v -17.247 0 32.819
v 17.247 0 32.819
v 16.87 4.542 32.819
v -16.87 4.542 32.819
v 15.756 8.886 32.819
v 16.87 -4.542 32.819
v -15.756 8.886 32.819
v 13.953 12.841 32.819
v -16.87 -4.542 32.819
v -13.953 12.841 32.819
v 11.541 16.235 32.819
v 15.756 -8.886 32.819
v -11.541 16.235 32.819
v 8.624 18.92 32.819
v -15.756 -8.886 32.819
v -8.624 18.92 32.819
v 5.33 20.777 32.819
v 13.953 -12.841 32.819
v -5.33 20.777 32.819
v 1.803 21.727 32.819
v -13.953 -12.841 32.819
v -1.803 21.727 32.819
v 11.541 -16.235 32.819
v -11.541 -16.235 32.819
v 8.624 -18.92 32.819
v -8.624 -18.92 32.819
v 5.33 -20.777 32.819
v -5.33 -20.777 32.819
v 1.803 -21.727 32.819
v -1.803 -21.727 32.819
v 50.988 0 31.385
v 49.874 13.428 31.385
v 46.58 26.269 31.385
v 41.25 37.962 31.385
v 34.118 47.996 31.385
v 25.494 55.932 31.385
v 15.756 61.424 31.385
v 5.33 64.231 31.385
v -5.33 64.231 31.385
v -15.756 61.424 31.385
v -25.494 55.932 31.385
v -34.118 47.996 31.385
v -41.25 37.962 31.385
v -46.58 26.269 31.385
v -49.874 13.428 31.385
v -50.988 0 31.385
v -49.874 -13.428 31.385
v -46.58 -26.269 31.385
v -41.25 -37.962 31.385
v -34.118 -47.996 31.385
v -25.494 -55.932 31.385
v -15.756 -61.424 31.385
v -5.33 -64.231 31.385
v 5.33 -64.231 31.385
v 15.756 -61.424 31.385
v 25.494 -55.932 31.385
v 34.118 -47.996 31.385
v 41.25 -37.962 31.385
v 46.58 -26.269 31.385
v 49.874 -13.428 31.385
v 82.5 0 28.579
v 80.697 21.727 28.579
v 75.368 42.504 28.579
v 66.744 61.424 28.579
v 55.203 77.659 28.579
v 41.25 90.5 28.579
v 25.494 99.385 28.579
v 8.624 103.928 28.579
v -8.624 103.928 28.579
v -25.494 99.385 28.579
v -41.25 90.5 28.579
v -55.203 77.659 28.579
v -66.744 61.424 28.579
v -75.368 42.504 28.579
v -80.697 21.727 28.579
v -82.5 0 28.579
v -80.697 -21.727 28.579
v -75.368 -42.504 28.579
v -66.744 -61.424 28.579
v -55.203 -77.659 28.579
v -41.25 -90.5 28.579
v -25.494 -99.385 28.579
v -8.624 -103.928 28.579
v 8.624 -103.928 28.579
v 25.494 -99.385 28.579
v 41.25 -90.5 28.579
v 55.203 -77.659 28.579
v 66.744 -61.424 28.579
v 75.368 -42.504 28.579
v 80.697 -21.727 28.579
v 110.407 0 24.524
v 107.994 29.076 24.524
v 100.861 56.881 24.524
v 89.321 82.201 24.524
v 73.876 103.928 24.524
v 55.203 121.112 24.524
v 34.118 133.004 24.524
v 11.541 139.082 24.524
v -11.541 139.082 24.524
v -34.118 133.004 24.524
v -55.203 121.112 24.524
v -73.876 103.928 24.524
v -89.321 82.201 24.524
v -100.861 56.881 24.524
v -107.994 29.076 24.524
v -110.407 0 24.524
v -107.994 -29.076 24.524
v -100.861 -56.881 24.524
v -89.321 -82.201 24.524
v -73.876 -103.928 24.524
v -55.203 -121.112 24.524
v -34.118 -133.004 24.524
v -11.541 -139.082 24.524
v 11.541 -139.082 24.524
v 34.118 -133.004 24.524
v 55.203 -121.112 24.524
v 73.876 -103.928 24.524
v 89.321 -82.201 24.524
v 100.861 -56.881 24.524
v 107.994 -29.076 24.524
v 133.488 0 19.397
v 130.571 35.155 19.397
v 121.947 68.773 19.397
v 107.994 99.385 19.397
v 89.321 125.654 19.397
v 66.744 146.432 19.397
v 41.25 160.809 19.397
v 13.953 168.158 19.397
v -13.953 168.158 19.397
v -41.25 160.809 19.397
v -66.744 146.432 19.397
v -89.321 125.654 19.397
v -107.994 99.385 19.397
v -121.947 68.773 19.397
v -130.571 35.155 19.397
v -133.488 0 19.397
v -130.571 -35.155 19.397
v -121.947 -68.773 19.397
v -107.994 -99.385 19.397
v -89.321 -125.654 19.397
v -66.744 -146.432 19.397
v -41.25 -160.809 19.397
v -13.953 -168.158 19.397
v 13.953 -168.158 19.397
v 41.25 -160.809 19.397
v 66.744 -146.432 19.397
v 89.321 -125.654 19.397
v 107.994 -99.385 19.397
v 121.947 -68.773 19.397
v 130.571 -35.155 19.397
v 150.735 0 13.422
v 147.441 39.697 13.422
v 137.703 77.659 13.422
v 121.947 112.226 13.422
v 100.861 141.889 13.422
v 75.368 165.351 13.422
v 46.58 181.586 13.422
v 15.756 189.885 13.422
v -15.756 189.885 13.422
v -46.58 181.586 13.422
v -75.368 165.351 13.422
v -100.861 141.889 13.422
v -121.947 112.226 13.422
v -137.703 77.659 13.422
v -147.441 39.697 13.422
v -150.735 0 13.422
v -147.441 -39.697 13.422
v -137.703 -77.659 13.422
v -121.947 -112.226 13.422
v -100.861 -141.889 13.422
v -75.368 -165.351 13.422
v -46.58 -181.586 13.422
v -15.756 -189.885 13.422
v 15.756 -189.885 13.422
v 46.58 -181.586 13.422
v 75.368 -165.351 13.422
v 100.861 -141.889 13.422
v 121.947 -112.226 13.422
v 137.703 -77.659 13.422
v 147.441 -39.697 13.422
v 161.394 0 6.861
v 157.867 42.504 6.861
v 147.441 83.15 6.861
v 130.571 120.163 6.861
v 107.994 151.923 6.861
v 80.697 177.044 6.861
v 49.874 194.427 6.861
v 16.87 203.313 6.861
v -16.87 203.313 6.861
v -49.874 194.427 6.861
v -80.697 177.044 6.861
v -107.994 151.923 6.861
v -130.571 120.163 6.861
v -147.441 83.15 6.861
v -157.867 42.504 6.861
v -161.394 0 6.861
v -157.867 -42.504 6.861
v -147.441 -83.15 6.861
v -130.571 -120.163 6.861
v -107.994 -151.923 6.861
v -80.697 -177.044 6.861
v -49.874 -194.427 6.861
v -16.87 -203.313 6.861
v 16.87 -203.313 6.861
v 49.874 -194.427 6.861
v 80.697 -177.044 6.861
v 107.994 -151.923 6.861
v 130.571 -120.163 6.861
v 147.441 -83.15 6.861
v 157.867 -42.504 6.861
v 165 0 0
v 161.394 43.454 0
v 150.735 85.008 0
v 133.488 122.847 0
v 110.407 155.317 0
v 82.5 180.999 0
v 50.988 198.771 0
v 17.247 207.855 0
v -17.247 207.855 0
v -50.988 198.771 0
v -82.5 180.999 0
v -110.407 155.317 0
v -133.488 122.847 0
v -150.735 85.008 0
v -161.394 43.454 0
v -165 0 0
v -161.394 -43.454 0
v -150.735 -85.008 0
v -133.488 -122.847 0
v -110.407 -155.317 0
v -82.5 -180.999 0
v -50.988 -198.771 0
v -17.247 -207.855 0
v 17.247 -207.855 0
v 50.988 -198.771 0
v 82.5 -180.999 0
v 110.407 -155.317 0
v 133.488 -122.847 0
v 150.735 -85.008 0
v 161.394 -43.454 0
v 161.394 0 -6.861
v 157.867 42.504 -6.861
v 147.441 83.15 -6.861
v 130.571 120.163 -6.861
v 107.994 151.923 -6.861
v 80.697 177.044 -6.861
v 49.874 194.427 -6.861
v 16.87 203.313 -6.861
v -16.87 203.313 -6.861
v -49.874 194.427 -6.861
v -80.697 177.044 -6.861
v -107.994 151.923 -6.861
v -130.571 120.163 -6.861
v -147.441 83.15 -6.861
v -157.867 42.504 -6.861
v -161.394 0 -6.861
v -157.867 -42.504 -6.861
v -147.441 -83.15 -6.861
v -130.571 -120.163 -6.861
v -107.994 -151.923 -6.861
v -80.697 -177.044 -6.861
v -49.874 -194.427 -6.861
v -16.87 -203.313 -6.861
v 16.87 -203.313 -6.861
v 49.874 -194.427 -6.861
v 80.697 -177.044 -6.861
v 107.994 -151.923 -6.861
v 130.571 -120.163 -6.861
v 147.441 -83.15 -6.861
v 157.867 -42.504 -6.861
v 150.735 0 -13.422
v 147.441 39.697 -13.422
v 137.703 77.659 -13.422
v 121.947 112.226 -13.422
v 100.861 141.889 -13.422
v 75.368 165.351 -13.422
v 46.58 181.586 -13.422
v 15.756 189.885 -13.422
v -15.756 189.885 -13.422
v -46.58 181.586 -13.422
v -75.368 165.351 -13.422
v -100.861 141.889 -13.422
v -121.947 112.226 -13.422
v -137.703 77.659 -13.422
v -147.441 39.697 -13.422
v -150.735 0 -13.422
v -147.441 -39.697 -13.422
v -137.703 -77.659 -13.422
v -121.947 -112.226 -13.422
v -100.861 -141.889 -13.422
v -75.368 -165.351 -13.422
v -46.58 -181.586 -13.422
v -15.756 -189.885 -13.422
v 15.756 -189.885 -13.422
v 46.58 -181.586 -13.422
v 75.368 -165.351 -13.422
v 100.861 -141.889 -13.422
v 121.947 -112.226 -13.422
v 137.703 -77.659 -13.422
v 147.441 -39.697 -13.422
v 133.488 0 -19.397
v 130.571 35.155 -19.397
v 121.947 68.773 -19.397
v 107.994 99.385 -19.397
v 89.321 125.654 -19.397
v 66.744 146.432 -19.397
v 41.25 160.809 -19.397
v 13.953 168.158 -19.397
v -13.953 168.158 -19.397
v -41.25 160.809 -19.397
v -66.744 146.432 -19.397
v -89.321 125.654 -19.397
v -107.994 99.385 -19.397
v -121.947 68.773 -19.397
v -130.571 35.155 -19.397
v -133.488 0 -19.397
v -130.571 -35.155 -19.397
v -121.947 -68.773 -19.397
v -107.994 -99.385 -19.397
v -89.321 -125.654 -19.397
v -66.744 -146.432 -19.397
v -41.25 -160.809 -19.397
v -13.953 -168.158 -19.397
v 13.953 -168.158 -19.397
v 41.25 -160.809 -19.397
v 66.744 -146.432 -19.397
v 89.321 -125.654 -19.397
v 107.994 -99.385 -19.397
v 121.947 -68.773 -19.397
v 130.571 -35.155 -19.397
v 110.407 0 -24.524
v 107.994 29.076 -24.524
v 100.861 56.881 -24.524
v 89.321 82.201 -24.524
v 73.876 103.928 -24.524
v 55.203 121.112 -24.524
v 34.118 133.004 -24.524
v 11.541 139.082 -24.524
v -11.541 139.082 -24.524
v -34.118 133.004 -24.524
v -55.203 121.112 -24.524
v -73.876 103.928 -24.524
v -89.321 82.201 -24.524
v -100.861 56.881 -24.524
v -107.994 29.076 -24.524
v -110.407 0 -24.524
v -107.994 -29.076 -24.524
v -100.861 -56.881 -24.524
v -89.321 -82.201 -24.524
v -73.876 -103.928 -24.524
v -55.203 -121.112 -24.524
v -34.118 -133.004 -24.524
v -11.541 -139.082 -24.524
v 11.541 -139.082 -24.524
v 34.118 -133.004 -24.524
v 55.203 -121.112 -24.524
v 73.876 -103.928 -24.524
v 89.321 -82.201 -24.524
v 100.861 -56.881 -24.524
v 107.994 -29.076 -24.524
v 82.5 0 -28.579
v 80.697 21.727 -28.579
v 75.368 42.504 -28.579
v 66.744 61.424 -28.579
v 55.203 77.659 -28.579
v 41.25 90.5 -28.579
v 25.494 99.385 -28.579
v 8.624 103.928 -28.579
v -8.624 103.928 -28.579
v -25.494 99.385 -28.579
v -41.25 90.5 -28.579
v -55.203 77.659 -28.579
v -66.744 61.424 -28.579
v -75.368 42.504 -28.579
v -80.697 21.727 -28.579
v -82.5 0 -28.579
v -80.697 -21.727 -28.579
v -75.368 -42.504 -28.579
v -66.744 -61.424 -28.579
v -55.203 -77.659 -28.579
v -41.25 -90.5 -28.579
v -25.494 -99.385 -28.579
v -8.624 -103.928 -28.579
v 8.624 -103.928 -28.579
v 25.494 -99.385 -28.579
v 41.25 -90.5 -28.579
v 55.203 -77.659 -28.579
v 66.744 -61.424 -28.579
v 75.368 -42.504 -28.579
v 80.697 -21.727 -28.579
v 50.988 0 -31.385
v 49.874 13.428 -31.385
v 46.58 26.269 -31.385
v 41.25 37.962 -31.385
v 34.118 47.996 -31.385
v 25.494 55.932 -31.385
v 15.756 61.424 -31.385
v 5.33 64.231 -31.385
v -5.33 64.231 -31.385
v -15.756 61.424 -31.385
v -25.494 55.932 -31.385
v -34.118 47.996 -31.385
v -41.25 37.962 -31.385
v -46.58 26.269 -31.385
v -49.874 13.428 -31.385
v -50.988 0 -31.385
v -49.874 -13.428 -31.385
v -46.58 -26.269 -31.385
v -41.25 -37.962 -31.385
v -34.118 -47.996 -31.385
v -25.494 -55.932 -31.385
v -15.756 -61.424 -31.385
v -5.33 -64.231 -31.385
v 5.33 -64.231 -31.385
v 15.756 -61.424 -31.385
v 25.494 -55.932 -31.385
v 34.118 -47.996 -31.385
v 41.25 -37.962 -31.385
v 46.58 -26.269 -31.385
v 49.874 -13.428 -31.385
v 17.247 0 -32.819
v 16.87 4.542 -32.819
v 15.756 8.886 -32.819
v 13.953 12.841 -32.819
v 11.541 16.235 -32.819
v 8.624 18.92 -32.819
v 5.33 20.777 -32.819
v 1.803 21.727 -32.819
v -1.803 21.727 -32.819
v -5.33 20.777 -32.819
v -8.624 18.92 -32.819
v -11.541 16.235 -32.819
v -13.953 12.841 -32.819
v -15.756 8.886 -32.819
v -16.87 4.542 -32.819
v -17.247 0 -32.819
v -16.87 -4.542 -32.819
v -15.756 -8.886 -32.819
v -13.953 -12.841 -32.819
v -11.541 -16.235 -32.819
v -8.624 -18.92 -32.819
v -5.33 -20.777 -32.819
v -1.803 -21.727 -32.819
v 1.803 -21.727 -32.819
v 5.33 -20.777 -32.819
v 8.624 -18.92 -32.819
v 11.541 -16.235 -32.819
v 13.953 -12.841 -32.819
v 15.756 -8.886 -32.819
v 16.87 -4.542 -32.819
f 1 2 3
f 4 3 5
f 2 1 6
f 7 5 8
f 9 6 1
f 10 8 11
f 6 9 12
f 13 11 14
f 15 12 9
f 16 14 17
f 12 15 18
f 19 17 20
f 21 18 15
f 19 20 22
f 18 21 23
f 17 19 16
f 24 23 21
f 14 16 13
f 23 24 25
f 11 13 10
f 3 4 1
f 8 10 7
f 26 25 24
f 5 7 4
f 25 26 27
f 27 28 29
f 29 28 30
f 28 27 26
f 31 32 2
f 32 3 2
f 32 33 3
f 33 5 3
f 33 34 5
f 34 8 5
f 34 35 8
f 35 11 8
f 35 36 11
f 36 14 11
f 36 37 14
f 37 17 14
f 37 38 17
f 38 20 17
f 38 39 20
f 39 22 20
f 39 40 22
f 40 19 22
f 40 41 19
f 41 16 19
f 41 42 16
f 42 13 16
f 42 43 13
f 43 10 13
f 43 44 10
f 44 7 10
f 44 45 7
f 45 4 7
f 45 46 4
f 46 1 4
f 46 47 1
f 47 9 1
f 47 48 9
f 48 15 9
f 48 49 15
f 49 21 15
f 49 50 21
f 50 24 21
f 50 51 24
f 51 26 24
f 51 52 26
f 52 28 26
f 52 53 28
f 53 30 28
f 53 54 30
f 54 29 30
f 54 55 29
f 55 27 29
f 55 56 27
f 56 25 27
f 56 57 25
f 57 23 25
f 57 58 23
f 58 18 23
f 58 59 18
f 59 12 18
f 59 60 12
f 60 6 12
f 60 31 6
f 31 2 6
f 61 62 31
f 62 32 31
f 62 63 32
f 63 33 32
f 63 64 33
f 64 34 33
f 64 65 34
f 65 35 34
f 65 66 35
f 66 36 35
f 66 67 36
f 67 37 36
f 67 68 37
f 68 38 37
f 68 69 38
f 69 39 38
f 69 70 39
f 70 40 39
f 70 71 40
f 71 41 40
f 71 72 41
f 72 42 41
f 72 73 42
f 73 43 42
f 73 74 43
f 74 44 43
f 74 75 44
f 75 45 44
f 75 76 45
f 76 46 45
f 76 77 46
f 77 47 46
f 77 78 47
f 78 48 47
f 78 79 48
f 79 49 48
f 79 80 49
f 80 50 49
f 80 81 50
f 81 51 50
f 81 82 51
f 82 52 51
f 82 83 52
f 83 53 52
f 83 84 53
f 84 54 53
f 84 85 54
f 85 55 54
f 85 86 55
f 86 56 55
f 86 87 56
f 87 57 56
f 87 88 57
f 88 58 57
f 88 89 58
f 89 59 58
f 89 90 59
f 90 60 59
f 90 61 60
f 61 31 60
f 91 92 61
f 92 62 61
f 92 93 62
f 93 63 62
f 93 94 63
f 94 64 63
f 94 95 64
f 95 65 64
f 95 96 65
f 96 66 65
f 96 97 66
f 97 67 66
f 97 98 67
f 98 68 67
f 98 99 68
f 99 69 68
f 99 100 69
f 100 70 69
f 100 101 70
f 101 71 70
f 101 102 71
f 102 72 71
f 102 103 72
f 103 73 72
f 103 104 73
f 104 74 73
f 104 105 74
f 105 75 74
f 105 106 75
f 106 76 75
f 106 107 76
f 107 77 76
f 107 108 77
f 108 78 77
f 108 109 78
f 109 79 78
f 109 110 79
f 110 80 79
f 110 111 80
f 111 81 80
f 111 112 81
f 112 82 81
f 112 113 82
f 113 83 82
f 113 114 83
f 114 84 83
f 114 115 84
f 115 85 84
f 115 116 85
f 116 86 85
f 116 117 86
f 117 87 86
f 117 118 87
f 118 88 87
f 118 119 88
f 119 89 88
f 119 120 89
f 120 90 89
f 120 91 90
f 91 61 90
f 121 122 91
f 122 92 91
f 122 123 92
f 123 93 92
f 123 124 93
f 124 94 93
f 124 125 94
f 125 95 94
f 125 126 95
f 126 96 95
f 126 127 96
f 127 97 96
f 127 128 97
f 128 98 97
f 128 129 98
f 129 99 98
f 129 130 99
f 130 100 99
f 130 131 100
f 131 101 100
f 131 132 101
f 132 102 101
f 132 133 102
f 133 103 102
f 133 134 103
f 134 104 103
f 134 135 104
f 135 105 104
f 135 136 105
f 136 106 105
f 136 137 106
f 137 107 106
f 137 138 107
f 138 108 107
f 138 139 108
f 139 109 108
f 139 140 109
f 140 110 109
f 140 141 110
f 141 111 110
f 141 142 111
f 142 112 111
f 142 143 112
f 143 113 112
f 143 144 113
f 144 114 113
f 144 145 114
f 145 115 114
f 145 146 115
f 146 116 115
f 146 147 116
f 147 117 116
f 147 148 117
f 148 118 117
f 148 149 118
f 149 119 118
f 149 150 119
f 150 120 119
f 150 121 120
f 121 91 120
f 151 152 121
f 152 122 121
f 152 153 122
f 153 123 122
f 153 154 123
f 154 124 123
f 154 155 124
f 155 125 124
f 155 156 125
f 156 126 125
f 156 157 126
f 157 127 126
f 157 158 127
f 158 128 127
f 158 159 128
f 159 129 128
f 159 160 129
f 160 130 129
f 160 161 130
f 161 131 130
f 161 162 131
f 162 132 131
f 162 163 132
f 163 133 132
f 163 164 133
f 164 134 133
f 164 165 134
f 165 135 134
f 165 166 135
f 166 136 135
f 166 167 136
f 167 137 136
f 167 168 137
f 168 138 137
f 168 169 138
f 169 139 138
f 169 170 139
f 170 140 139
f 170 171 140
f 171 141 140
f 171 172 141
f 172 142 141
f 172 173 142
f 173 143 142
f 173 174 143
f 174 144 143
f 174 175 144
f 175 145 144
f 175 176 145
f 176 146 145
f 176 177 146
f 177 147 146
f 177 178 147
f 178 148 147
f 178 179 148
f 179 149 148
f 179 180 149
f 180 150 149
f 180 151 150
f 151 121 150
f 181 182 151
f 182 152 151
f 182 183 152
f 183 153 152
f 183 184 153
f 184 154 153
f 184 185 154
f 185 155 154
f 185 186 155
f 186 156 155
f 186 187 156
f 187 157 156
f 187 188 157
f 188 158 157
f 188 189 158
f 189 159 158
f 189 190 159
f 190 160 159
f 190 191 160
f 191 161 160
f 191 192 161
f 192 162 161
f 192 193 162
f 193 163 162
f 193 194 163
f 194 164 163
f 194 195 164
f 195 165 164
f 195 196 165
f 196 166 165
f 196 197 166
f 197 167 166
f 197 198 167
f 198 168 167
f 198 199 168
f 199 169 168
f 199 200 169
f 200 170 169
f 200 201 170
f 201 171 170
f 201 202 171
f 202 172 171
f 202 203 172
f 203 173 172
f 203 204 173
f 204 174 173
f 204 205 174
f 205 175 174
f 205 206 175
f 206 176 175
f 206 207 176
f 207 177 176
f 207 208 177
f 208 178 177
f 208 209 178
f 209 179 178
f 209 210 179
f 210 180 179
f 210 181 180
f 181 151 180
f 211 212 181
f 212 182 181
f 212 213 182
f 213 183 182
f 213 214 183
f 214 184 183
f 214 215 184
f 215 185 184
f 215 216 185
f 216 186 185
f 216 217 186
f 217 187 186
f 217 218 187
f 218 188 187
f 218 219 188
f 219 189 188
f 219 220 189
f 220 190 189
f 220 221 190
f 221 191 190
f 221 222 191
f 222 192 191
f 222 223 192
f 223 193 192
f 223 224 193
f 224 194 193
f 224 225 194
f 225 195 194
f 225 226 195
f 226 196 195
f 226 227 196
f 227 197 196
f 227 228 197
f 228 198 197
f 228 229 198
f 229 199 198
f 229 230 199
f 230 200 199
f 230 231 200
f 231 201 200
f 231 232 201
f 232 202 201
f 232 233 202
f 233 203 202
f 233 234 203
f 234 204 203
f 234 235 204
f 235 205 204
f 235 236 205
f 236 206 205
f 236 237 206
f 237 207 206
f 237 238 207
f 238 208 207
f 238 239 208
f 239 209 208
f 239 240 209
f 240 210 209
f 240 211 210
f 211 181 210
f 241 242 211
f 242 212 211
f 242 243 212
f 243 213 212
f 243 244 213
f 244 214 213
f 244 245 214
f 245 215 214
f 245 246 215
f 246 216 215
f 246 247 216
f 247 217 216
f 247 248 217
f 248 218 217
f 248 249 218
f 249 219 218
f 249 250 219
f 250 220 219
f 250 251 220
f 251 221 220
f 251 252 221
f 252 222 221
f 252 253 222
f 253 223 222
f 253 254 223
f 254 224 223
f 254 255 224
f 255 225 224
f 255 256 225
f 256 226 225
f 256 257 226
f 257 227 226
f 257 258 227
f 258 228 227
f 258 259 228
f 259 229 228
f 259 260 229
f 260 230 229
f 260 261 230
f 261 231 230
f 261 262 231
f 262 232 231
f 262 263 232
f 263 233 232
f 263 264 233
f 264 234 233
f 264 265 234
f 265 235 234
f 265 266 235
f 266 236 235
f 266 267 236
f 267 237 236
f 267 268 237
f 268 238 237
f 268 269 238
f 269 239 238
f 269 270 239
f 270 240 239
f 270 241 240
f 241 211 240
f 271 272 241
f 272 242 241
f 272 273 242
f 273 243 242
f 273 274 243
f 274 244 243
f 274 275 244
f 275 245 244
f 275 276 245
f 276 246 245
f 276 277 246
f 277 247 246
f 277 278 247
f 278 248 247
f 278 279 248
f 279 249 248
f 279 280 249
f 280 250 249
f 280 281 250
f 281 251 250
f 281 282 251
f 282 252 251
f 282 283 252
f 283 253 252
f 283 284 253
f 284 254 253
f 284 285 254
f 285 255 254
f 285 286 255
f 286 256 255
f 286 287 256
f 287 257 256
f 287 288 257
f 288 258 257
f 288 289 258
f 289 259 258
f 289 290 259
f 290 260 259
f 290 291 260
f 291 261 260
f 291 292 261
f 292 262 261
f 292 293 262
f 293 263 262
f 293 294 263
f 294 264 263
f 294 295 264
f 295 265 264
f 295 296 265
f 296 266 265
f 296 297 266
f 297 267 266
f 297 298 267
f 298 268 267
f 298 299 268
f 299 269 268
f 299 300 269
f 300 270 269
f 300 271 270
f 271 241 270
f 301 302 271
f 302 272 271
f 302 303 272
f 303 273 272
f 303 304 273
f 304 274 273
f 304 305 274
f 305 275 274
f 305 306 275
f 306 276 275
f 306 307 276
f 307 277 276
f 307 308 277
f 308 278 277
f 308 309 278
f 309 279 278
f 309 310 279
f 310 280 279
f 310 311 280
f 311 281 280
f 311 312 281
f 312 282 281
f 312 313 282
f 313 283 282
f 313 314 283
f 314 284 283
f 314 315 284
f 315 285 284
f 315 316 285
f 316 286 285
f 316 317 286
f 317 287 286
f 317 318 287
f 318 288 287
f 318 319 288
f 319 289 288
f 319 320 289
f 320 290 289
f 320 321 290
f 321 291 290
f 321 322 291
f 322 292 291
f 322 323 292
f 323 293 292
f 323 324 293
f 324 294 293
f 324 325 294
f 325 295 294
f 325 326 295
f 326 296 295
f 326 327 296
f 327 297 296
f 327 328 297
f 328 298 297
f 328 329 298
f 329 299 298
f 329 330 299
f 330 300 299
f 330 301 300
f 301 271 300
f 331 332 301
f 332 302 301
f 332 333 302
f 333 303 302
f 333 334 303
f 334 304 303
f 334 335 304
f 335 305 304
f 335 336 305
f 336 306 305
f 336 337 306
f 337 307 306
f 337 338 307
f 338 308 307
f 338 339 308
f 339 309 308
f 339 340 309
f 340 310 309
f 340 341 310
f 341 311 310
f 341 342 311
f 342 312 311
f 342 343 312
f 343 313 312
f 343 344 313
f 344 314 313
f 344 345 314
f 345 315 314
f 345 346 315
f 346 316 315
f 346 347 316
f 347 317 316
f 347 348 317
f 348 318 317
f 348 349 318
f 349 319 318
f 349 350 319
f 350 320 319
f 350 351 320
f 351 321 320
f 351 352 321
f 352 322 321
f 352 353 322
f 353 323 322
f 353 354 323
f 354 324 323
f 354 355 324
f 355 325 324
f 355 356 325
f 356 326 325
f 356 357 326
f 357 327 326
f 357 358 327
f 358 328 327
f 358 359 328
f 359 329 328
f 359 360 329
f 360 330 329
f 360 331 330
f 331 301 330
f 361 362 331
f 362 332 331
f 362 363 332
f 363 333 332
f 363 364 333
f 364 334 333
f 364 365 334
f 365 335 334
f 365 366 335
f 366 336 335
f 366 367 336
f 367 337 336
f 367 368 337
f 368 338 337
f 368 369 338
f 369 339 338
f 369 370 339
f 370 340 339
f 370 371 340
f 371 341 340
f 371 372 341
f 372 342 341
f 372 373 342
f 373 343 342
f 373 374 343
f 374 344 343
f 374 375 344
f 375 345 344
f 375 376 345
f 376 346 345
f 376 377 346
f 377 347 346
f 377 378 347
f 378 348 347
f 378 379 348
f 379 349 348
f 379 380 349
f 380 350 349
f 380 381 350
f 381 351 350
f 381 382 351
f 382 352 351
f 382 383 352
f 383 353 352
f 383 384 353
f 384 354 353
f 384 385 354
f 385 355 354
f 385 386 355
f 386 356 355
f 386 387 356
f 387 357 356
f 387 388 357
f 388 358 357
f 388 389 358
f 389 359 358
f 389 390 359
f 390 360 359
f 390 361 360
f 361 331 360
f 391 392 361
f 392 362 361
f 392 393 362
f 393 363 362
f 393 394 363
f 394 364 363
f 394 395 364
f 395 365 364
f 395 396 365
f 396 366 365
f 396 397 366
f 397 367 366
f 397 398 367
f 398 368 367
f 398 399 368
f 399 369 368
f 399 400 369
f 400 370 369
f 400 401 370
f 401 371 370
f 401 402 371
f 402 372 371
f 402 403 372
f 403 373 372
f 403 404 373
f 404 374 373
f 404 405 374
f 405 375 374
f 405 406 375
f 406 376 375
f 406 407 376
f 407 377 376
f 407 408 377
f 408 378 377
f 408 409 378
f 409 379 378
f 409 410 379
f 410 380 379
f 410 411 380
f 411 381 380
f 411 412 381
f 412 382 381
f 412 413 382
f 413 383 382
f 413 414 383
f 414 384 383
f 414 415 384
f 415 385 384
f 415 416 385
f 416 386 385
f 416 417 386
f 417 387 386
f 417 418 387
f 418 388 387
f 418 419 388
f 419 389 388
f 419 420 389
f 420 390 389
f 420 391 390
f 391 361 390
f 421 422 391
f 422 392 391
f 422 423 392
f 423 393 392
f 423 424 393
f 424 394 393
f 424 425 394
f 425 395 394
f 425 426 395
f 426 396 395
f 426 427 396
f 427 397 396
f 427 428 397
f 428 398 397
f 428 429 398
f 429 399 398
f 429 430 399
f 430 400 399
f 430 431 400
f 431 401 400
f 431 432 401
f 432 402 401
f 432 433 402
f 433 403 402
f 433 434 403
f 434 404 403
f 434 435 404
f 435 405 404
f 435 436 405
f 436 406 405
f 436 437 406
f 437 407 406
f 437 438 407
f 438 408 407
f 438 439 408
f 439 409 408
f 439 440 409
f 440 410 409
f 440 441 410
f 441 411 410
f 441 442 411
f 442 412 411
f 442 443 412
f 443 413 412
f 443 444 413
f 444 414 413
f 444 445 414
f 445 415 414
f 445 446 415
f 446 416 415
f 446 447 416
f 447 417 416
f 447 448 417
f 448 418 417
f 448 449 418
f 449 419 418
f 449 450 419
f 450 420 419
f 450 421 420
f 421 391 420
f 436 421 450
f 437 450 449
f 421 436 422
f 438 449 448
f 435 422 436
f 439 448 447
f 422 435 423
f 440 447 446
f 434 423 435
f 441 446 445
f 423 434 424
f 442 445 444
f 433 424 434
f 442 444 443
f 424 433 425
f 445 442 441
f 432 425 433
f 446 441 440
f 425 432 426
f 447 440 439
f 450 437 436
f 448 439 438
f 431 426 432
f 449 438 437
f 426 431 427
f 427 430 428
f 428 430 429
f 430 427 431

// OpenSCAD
// Generated by SolidPython 1.0.1 on 2020-07-29 00:46:52


scale(v = [15, 19, 3]) {
	sphere(r = 11);
}
/***********************************************
*********      SolidPython code:      **********
************************************************
 
# import packages: SolidPython
from solid import *
from solid.utils import *
from itertools import chain, combinations, permutations


class Resize:

    def __init__(self, scad_file):
        self.scad_file = scad_file
        #self.scad_file = import_scad(scad_file)
        # cone/cylinder param:
        self.r1 = 0
        self.r2 = 0
        self.h = 0
        # rectangular prism param:
        self.w = 0
        self.l = 0
        # ellipse param:
        self.r = 0

    # import OpenScad code (file name corresponds to shape)


    # classify shape + parameters
    def assign(self, param1, param2, param3):
        if self.scad_file == 'cone.scad':
            self.r1 = param1
            self.r2 = param2
            self.h = param3
        elif self.scad_file == 'cylinder.scad':
            self.r1 = param1
            self.r2 = param2
            self.h = param3
        elif self.scad_file == 'rectangularPrism.scad':
            self.h = param1
            self.l = param2
            self.w = param3
        else:
            self.r = param1
            self.h = param2

    # resize parameters
    def iterate(self):
        x = range(3, 20, 2)
        i = 1
        if self.scad_file == 'cone.scad':
            tempList = list(permutations(x, 2))
            for temp in tempList:
                param1 = temp[0]
                param2 = temp[1]
                filepath = 'produced_scad_files/' + 'cone' + str(param1) + '_' + str(param2) + '_' + '.scad'
                scad_render_to_file(cylinder(h=param1, r1=param2, r2=0), filepath)

        elif self.scad_file == 'cylinder.scad':
            tempList = list(permutations(x, 3))
            for temp in tempList:
                param1 = temp[0]
                param2 = temp[1]
                filepath = 'produced_scad_files/' + 'cylinder' + str(param1) + '_' + str(param2) + '_' + '.scad'
                scad_render_to_file(cylinder(h=param1, r1=param2, r2=param2), filepath)

        elif self.scad_file == 'rectangularPrism.scad':
            tempList = list(permutations(x, 3))
            for temp in tempList:
                param1 = temp[0]
                param2 = temp[1]
                param3 = temp[2]
                filepath = 'produced_scad_files/' + 'rectangularPrism' + str(param1) + '_' + str(param2) + '_' + str(
                    param3) + '.scad'
                scad_render_to_file(cube(size=(param1, param2, param3)), filepath)

        elif self.scad_file == 'ellipse.scad':
            tempList = list(permutations(x, 4))
            for temp in tempList:
                param1 = temp[0]
                param2 = temp[1]
                param3 = temp[2]
                param4 = temp[3]
                filepath = 'produced_scad_files/' + 'ellipse' + str(param1) + '_' + str(param2) + '_' + str(param3) + '_' + str(param4) + '.scad'
                scad_render_to_file(scale([param1, param2, param3])(sphere(r=param4)), filepath)

    def render_to_scadfile(self):
        scad_render_to_file(scad, 'example.scad') 
 
************************************************/
